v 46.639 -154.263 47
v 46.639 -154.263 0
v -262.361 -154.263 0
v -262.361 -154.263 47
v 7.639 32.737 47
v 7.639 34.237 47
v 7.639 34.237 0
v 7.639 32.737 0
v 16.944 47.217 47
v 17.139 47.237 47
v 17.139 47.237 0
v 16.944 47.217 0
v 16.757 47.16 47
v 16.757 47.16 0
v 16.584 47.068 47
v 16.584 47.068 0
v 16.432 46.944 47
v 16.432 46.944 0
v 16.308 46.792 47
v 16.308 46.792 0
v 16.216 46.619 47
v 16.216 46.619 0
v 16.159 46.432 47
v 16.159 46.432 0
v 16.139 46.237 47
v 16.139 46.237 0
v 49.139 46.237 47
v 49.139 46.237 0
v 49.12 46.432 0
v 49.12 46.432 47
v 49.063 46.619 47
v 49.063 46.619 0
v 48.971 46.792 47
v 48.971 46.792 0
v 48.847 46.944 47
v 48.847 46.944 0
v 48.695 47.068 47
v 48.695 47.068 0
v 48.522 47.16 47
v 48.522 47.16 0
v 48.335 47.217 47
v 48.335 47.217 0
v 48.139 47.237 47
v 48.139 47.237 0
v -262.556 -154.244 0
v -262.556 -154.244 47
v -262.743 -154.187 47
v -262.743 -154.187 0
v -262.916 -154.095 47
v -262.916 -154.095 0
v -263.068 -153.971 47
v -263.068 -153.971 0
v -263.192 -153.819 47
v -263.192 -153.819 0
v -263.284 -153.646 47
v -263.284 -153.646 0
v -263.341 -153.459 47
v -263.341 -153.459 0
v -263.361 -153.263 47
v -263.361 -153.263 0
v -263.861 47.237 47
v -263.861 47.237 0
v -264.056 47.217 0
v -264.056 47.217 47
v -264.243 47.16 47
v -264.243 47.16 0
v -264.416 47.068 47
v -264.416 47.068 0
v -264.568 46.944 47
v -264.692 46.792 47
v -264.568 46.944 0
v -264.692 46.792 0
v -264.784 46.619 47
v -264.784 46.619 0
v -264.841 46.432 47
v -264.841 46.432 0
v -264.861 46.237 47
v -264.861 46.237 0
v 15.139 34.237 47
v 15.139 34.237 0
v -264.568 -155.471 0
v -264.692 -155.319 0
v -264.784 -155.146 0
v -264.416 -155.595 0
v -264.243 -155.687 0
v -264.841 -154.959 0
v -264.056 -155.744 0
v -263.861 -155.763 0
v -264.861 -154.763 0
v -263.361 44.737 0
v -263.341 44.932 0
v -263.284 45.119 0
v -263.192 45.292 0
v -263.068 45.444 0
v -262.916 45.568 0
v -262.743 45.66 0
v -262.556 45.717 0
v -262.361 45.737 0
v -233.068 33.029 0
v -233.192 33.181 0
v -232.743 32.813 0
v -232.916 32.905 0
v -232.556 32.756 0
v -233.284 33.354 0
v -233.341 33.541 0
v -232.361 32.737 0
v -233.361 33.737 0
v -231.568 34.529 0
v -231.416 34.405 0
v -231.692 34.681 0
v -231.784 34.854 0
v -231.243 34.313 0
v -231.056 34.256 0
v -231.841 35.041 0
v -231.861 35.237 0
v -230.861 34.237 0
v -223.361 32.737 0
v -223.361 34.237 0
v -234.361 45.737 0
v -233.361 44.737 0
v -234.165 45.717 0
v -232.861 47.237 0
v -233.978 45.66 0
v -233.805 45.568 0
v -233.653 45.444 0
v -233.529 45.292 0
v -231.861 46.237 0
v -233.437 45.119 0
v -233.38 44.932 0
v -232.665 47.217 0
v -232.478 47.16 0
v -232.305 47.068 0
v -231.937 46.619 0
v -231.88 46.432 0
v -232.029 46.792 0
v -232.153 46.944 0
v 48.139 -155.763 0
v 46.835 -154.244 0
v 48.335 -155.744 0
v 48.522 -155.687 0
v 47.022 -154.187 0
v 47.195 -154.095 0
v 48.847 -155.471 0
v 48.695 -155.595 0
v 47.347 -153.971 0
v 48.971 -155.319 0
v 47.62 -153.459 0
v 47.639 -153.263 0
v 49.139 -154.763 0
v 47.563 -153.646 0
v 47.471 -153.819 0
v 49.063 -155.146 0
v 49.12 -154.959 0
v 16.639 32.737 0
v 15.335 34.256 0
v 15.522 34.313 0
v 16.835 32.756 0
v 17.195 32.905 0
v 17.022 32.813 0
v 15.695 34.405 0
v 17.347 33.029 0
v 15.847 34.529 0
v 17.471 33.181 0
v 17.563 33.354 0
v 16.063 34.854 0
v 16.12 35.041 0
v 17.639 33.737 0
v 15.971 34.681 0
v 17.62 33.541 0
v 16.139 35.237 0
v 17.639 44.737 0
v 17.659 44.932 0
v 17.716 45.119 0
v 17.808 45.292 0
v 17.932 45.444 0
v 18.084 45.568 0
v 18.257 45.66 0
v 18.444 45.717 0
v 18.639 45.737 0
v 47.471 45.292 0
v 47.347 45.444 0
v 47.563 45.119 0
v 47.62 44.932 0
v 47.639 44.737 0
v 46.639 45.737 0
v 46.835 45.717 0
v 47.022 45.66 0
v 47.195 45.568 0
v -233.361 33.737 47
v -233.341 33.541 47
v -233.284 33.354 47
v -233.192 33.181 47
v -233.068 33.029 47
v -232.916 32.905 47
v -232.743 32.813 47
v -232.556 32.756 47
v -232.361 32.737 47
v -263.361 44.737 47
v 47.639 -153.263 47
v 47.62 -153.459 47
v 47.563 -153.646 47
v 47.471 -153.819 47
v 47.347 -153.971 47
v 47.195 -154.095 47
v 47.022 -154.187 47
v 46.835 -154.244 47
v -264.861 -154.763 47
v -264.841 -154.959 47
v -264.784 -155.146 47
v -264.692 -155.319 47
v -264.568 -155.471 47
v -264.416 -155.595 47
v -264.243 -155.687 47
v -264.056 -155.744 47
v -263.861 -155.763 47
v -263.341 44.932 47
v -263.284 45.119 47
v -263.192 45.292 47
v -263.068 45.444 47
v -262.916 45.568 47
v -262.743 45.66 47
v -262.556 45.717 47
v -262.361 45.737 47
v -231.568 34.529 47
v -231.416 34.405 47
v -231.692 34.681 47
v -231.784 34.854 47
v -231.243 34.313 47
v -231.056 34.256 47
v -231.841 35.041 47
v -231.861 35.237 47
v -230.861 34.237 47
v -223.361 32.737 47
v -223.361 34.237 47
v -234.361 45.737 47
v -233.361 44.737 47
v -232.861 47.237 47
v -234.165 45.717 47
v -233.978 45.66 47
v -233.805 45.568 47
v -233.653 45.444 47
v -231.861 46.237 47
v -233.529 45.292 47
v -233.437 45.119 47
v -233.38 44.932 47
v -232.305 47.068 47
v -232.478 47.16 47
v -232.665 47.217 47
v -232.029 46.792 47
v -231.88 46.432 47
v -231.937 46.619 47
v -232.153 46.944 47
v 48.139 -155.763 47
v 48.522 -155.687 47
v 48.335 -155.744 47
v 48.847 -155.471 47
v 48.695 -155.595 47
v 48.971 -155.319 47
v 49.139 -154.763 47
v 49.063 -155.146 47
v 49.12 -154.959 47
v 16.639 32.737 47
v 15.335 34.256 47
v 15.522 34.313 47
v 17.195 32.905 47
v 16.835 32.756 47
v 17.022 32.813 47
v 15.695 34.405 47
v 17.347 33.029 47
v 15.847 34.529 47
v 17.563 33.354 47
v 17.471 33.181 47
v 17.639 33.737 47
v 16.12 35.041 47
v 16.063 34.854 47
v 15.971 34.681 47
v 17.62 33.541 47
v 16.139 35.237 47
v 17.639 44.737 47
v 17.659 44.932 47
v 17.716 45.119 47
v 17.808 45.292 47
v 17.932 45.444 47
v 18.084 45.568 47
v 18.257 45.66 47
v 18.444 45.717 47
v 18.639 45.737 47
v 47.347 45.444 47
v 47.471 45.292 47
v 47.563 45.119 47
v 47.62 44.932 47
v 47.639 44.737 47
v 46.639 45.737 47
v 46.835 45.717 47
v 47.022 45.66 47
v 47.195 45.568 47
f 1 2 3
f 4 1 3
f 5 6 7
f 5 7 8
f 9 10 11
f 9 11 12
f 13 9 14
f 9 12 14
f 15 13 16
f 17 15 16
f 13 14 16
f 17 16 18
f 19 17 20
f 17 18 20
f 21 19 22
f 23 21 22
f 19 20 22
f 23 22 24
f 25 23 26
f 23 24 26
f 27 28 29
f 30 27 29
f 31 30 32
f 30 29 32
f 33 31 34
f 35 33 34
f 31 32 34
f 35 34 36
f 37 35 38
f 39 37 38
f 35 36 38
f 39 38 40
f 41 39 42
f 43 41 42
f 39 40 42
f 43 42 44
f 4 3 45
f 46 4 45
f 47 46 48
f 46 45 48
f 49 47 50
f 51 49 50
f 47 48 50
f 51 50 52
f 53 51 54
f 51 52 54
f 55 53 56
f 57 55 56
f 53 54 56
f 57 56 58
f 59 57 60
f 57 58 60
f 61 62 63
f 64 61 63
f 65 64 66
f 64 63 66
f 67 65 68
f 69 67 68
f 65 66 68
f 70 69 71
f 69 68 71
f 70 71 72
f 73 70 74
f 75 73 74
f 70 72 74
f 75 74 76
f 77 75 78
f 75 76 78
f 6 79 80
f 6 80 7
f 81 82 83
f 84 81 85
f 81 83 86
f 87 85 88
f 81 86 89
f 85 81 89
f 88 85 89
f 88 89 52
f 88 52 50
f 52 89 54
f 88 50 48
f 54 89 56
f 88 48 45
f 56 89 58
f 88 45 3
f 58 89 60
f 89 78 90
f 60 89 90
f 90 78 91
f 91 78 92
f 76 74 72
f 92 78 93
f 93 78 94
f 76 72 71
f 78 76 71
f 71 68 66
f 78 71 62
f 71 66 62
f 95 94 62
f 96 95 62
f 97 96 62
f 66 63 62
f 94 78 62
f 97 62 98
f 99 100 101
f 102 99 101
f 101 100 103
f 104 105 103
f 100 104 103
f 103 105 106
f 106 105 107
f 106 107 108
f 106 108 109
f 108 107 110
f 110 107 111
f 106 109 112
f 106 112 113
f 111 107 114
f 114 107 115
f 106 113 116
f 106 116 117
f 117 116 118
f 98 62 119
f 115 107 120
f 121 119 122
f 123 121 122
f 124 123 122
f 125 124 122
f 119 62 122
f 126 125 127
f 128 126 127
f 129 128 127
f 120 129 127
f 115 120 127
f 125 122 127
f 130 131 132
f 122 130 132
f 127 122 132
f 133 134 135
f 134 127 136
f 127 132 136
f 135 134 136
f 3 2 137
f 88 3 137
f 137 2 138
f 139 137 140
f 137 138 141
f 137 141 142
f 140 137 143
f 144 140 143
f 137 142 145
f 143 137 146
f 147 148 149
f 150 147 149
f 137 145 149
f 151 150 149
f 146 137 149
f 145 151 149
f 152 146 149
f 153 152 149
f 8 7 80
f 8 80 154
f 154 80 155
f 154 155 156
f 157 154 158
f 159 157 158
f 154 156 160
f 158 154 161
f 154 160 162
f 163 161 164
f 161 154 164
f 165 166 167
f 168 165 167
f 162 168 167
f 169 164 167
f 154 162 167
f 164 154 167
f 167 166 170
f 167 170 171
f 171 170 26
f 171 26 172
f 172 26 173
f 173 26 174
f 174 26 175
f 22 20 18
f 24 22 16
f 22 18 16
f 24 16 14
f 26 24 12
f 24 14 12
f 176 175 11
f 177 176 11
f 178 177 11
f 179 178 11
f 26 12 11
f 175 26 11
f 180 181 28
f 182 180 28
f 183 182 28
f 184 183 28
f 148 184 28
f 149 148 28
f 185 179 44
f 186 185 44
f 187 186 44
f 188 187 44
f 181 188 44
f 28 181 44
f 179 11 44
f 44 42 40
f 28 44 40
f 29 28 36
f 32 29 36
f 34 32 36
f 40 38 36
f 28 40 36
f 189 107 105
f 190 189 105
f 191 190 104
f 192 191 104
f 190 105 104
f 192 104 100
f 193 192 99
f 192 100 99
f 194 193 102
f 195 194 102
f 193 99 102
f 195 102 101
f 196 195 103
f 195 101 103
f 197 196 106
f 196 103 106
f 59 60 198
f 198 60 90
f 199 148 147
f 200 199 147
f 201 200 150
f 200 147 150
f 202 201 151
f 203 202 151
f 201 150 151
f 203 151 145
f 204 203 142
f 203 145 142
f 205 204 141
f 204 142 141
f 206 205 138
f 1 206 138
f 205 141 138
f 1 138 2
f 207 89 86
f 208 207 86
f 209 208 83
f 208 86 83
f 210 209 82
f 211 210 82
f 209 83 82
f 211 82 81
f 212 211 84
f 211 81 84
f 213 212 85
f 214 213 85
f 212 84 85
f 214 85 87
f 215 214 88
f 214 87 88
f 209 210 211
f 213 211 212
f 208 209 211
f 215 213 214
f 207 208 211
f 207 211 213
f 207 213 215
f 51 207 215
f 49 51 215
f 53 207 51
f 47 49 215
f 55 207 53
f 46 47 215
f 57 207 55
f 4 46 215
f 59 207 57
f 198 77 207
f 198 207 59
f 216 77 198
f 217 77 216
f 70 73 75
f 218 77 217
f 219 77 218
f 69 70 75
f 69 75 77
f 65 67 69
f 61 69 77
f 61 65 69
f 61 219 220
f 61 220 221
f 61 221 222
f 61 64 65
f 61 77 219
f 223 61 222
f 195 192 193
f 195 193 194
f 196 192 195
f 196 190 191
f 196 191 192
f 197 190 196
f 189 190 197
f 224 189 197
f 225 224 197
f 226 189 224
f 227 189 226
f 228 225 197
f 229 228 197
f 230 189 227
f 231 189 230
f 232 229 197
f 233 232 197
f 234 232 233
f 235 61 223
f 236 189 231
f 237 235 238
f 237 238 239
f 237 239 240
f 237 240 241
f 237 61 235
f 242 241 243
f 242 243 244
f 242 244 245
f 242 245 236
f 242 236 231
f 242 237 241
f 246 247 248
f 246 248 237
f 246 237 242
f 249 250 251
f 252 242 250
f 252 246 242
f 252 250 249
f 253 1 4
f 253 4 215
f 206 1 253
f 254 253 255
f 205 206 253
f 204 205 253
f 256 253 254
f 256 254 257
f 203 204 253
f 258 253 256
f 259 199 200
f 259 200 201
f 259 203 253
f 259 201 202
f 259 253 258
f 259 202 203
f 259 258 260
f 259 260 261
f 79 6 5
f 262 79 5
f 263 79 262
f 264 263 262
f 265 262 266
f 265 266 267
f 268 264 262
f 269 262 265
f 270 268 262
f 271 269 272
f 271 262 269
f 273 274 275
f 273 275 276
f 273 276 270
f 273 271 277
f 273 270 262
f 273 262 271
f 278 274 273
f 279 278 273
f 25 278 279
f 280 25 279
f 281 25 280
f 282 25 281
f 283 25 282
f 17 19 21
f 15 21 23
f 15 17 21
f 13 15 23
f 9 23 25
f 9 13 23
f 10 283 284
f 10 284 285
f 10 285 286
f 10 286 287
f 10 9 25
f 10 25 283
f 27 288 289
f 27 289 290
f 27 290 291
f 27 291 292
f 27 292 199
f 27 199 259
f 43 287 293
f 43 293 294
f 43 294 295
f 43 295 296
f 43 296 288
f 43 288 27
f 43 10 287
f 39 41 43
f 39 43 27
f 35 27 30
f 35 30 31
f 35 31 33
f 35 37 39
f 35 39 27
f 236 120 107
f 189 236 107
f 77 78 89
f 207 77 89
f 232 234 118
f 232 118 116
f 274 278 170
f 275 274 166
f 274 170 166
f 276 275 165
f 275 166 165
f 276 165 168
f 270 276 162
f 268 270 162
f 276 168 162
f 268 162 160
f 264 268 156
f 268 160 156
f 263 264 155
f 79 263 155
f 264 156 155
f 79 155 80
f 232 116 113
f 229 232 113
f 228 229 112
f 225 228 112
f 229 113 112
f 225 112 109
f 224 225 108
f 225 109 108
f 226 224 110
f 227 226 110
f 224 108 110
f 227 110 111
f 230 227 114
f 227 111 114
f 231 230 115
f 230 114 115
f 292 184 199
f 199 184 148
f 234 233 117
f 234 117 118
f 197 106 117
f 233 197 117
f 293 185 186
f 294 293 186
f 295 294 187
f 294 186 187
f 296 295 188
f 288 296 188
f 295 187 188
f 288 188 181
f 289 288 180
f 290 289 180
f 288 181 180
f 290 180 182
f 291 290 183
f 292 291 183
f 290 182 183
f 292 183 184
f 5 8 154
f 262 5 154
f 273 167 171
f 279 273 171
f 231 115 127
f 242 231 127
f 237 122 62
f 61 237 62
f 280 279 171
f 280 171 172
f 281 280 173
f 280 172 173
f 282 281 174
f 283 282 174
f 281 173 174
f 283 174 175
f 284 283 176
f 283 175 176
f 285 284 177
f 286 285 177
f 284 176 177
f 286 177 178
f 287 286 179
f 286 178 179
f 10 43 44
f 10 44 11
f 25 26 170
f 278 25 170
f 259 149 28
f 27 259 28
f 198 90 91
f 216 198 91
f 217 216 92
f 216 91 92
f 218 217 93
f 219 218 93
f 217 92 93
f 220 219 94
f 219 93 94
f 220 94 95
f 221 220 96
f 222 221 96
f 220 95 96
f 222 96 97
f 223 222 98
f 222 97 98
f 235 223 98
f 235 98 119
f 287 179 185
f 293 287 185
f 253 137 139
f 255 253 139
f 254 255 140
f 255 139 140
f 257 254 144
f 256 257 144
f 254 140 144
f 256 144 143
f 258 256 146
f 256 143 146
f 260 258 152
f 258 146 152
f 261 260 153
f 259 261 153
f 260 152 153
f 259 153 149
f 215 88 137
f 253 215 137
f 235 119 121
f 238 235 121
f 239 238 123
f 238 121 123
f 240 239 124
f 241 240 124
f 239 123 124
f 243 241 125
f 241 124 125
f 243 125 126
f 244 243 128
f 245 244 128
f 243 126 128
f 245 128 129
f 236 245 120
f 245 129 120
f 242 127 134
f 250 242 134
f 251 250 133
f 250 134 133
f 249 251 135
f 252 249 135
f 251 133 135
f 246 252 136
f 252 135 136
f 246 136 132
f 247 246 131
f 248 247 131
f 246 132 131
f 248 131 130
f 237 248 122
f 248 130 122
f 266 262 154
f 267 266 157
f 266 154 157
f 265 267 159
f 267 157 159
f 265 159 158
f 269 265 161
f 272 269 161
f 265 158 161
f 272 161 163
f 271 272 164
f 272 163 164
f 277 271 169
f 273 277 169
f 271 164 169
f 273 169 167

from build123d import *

# Parameters (mm, degrees)
EXTRUDE_1_DEPTH = 47


with BuildPart() as part:
    # 草图1 → 凸台-拉伸1 (new body)
    with BuildSketch(Plane.XY):
        with BuildLine():
            Line((18.639450369, 45.736574885), (46.639450369, 45.736574885))
            ThreePointArc((46.639450369, 45.736574885), (47.34655715, 45.443681666), (47.639450369, 44.736574885))
            Line((47.639450369, 44.736574885), (47.639450369, -153.263425115))
            ThreePointArc((47.639450369, -153.263425115), (47.34655715, -153.970531897), (46.639450369, -154.263425115))
            Line((46.639450369, -154.263425115), (-262.360549631, -154.263425115))
            ThreePointArc((-262.360549631, -154.263425115), (-263.067656412, -153.970531897), (-263.360549631, -153.263425115))
            Line((-263.360549631, -153.263425115), (-263.360549631, 44.736574885))
            ThreePointArc((-263.360549631, 44.736574885), (-263.067656412, 45.443681666), (-262.360549631, 45.736574885))
            Line((-262.360549631, 45.736574885), (-234.360549631, 45.736574885))
            ThreePointArc((-234.360549631, 45.736574885), (-233.65344285, 45.443681666), (-233.360549631, 44.736574885))
            Line((-233.360549631, 44.736574885), (-233.360549631, 33.736574885))
            ThreePointArc((-233.360549631, 33.736574885), (-233.067656412, 33.029468103), (-232.360549631, 32.736574885))
            Line((-232.360549631, 32.736574885), (-223.360549631, 32.736574885))
            Line((-223.360549631, 32.736574885), (-223.360549631, 34.236574885))
            Line((-223.360549631, 34.236574885), (-230.860549631, 34.236574885))
            ThreePointArc((-230.860549631, 34.236574885), (-231.567656412, 34.529468103), (-231.860549631, 35.236574885))
            Line((-231.860549631, 35.236574885), (-231.860549631, 46.236574885))
            ThreePointArc((-231.860549631, 46.236574885), (-232.15344285, 46.943681666), (-232.860549631, 47.236574885))
            Line((-232.860549631, 47.236574885), (-263.860549631, 47.236574885))
            ThreePointArc((-263.860549631, 47.236574885), (-264.567656412, 46.943681666), (-264.860549631, 46.236574885))
            Line((-264.860549631, 46.236574885), (-264.860549631, -154.763425115))
            ThreePointArc((-264.860549631, -154.763425115), (-264.567656412, -155.470531897), (-263.860549631, -155.763425115))
            Line((-263.860549631, -155.763425115), (48.139450369, -155.763425115))
            ThreePointArc((48.139450369, -155.763425115), (48.84655715, -155.470531897), (49.139450369, -154.763425115))
            Line((49.139450369, -154.763425115), (49.139450369, 46.236574885))
            ThreePointArc((49.139450369, 46.236574885), (48.84655715, 46.943681666), (48.139450369, 47.236574885))
            Line((48.139450369, 47.236574885), (17.139450369, 47.236574885))
            ThreePointArc((17.139450369, 47.236574885), (16.432343588, 46.943681666), (16.139450369, 46.236574885))
            Line((16.139450369, 46.236574885), (16.139450369, 35.236574885))
            ThreePointArc((16.139450369, 35.236574885), (15.84655715, 34.529468103), (15.139450369, 34.236574885))
            Line((15.139450369, 34.236574885), (7.639450369, 34.236574885))
            Line((7.639450369, 34.236574885), (7.639450369, 32.736574885))
            Line((7.639450369, 32.736574885), (16.639450369, 32.736574885))
            ThreePointArc((16.639450369, 32.736574885), (17.34655715, 33.029468103), (17.639450369, 33.736574885))
            Line((17.639450369, 33.736574885), (17.639450369, 44.736574885))
            ThreePointArc((17.639450369, 44.736574885), (17.932343588, 45.443681666), (18.639450369, 45.736574885))
        make_face()
    extrude(amount=EXTRUDE_1_DEPTH)


solid = part.part
